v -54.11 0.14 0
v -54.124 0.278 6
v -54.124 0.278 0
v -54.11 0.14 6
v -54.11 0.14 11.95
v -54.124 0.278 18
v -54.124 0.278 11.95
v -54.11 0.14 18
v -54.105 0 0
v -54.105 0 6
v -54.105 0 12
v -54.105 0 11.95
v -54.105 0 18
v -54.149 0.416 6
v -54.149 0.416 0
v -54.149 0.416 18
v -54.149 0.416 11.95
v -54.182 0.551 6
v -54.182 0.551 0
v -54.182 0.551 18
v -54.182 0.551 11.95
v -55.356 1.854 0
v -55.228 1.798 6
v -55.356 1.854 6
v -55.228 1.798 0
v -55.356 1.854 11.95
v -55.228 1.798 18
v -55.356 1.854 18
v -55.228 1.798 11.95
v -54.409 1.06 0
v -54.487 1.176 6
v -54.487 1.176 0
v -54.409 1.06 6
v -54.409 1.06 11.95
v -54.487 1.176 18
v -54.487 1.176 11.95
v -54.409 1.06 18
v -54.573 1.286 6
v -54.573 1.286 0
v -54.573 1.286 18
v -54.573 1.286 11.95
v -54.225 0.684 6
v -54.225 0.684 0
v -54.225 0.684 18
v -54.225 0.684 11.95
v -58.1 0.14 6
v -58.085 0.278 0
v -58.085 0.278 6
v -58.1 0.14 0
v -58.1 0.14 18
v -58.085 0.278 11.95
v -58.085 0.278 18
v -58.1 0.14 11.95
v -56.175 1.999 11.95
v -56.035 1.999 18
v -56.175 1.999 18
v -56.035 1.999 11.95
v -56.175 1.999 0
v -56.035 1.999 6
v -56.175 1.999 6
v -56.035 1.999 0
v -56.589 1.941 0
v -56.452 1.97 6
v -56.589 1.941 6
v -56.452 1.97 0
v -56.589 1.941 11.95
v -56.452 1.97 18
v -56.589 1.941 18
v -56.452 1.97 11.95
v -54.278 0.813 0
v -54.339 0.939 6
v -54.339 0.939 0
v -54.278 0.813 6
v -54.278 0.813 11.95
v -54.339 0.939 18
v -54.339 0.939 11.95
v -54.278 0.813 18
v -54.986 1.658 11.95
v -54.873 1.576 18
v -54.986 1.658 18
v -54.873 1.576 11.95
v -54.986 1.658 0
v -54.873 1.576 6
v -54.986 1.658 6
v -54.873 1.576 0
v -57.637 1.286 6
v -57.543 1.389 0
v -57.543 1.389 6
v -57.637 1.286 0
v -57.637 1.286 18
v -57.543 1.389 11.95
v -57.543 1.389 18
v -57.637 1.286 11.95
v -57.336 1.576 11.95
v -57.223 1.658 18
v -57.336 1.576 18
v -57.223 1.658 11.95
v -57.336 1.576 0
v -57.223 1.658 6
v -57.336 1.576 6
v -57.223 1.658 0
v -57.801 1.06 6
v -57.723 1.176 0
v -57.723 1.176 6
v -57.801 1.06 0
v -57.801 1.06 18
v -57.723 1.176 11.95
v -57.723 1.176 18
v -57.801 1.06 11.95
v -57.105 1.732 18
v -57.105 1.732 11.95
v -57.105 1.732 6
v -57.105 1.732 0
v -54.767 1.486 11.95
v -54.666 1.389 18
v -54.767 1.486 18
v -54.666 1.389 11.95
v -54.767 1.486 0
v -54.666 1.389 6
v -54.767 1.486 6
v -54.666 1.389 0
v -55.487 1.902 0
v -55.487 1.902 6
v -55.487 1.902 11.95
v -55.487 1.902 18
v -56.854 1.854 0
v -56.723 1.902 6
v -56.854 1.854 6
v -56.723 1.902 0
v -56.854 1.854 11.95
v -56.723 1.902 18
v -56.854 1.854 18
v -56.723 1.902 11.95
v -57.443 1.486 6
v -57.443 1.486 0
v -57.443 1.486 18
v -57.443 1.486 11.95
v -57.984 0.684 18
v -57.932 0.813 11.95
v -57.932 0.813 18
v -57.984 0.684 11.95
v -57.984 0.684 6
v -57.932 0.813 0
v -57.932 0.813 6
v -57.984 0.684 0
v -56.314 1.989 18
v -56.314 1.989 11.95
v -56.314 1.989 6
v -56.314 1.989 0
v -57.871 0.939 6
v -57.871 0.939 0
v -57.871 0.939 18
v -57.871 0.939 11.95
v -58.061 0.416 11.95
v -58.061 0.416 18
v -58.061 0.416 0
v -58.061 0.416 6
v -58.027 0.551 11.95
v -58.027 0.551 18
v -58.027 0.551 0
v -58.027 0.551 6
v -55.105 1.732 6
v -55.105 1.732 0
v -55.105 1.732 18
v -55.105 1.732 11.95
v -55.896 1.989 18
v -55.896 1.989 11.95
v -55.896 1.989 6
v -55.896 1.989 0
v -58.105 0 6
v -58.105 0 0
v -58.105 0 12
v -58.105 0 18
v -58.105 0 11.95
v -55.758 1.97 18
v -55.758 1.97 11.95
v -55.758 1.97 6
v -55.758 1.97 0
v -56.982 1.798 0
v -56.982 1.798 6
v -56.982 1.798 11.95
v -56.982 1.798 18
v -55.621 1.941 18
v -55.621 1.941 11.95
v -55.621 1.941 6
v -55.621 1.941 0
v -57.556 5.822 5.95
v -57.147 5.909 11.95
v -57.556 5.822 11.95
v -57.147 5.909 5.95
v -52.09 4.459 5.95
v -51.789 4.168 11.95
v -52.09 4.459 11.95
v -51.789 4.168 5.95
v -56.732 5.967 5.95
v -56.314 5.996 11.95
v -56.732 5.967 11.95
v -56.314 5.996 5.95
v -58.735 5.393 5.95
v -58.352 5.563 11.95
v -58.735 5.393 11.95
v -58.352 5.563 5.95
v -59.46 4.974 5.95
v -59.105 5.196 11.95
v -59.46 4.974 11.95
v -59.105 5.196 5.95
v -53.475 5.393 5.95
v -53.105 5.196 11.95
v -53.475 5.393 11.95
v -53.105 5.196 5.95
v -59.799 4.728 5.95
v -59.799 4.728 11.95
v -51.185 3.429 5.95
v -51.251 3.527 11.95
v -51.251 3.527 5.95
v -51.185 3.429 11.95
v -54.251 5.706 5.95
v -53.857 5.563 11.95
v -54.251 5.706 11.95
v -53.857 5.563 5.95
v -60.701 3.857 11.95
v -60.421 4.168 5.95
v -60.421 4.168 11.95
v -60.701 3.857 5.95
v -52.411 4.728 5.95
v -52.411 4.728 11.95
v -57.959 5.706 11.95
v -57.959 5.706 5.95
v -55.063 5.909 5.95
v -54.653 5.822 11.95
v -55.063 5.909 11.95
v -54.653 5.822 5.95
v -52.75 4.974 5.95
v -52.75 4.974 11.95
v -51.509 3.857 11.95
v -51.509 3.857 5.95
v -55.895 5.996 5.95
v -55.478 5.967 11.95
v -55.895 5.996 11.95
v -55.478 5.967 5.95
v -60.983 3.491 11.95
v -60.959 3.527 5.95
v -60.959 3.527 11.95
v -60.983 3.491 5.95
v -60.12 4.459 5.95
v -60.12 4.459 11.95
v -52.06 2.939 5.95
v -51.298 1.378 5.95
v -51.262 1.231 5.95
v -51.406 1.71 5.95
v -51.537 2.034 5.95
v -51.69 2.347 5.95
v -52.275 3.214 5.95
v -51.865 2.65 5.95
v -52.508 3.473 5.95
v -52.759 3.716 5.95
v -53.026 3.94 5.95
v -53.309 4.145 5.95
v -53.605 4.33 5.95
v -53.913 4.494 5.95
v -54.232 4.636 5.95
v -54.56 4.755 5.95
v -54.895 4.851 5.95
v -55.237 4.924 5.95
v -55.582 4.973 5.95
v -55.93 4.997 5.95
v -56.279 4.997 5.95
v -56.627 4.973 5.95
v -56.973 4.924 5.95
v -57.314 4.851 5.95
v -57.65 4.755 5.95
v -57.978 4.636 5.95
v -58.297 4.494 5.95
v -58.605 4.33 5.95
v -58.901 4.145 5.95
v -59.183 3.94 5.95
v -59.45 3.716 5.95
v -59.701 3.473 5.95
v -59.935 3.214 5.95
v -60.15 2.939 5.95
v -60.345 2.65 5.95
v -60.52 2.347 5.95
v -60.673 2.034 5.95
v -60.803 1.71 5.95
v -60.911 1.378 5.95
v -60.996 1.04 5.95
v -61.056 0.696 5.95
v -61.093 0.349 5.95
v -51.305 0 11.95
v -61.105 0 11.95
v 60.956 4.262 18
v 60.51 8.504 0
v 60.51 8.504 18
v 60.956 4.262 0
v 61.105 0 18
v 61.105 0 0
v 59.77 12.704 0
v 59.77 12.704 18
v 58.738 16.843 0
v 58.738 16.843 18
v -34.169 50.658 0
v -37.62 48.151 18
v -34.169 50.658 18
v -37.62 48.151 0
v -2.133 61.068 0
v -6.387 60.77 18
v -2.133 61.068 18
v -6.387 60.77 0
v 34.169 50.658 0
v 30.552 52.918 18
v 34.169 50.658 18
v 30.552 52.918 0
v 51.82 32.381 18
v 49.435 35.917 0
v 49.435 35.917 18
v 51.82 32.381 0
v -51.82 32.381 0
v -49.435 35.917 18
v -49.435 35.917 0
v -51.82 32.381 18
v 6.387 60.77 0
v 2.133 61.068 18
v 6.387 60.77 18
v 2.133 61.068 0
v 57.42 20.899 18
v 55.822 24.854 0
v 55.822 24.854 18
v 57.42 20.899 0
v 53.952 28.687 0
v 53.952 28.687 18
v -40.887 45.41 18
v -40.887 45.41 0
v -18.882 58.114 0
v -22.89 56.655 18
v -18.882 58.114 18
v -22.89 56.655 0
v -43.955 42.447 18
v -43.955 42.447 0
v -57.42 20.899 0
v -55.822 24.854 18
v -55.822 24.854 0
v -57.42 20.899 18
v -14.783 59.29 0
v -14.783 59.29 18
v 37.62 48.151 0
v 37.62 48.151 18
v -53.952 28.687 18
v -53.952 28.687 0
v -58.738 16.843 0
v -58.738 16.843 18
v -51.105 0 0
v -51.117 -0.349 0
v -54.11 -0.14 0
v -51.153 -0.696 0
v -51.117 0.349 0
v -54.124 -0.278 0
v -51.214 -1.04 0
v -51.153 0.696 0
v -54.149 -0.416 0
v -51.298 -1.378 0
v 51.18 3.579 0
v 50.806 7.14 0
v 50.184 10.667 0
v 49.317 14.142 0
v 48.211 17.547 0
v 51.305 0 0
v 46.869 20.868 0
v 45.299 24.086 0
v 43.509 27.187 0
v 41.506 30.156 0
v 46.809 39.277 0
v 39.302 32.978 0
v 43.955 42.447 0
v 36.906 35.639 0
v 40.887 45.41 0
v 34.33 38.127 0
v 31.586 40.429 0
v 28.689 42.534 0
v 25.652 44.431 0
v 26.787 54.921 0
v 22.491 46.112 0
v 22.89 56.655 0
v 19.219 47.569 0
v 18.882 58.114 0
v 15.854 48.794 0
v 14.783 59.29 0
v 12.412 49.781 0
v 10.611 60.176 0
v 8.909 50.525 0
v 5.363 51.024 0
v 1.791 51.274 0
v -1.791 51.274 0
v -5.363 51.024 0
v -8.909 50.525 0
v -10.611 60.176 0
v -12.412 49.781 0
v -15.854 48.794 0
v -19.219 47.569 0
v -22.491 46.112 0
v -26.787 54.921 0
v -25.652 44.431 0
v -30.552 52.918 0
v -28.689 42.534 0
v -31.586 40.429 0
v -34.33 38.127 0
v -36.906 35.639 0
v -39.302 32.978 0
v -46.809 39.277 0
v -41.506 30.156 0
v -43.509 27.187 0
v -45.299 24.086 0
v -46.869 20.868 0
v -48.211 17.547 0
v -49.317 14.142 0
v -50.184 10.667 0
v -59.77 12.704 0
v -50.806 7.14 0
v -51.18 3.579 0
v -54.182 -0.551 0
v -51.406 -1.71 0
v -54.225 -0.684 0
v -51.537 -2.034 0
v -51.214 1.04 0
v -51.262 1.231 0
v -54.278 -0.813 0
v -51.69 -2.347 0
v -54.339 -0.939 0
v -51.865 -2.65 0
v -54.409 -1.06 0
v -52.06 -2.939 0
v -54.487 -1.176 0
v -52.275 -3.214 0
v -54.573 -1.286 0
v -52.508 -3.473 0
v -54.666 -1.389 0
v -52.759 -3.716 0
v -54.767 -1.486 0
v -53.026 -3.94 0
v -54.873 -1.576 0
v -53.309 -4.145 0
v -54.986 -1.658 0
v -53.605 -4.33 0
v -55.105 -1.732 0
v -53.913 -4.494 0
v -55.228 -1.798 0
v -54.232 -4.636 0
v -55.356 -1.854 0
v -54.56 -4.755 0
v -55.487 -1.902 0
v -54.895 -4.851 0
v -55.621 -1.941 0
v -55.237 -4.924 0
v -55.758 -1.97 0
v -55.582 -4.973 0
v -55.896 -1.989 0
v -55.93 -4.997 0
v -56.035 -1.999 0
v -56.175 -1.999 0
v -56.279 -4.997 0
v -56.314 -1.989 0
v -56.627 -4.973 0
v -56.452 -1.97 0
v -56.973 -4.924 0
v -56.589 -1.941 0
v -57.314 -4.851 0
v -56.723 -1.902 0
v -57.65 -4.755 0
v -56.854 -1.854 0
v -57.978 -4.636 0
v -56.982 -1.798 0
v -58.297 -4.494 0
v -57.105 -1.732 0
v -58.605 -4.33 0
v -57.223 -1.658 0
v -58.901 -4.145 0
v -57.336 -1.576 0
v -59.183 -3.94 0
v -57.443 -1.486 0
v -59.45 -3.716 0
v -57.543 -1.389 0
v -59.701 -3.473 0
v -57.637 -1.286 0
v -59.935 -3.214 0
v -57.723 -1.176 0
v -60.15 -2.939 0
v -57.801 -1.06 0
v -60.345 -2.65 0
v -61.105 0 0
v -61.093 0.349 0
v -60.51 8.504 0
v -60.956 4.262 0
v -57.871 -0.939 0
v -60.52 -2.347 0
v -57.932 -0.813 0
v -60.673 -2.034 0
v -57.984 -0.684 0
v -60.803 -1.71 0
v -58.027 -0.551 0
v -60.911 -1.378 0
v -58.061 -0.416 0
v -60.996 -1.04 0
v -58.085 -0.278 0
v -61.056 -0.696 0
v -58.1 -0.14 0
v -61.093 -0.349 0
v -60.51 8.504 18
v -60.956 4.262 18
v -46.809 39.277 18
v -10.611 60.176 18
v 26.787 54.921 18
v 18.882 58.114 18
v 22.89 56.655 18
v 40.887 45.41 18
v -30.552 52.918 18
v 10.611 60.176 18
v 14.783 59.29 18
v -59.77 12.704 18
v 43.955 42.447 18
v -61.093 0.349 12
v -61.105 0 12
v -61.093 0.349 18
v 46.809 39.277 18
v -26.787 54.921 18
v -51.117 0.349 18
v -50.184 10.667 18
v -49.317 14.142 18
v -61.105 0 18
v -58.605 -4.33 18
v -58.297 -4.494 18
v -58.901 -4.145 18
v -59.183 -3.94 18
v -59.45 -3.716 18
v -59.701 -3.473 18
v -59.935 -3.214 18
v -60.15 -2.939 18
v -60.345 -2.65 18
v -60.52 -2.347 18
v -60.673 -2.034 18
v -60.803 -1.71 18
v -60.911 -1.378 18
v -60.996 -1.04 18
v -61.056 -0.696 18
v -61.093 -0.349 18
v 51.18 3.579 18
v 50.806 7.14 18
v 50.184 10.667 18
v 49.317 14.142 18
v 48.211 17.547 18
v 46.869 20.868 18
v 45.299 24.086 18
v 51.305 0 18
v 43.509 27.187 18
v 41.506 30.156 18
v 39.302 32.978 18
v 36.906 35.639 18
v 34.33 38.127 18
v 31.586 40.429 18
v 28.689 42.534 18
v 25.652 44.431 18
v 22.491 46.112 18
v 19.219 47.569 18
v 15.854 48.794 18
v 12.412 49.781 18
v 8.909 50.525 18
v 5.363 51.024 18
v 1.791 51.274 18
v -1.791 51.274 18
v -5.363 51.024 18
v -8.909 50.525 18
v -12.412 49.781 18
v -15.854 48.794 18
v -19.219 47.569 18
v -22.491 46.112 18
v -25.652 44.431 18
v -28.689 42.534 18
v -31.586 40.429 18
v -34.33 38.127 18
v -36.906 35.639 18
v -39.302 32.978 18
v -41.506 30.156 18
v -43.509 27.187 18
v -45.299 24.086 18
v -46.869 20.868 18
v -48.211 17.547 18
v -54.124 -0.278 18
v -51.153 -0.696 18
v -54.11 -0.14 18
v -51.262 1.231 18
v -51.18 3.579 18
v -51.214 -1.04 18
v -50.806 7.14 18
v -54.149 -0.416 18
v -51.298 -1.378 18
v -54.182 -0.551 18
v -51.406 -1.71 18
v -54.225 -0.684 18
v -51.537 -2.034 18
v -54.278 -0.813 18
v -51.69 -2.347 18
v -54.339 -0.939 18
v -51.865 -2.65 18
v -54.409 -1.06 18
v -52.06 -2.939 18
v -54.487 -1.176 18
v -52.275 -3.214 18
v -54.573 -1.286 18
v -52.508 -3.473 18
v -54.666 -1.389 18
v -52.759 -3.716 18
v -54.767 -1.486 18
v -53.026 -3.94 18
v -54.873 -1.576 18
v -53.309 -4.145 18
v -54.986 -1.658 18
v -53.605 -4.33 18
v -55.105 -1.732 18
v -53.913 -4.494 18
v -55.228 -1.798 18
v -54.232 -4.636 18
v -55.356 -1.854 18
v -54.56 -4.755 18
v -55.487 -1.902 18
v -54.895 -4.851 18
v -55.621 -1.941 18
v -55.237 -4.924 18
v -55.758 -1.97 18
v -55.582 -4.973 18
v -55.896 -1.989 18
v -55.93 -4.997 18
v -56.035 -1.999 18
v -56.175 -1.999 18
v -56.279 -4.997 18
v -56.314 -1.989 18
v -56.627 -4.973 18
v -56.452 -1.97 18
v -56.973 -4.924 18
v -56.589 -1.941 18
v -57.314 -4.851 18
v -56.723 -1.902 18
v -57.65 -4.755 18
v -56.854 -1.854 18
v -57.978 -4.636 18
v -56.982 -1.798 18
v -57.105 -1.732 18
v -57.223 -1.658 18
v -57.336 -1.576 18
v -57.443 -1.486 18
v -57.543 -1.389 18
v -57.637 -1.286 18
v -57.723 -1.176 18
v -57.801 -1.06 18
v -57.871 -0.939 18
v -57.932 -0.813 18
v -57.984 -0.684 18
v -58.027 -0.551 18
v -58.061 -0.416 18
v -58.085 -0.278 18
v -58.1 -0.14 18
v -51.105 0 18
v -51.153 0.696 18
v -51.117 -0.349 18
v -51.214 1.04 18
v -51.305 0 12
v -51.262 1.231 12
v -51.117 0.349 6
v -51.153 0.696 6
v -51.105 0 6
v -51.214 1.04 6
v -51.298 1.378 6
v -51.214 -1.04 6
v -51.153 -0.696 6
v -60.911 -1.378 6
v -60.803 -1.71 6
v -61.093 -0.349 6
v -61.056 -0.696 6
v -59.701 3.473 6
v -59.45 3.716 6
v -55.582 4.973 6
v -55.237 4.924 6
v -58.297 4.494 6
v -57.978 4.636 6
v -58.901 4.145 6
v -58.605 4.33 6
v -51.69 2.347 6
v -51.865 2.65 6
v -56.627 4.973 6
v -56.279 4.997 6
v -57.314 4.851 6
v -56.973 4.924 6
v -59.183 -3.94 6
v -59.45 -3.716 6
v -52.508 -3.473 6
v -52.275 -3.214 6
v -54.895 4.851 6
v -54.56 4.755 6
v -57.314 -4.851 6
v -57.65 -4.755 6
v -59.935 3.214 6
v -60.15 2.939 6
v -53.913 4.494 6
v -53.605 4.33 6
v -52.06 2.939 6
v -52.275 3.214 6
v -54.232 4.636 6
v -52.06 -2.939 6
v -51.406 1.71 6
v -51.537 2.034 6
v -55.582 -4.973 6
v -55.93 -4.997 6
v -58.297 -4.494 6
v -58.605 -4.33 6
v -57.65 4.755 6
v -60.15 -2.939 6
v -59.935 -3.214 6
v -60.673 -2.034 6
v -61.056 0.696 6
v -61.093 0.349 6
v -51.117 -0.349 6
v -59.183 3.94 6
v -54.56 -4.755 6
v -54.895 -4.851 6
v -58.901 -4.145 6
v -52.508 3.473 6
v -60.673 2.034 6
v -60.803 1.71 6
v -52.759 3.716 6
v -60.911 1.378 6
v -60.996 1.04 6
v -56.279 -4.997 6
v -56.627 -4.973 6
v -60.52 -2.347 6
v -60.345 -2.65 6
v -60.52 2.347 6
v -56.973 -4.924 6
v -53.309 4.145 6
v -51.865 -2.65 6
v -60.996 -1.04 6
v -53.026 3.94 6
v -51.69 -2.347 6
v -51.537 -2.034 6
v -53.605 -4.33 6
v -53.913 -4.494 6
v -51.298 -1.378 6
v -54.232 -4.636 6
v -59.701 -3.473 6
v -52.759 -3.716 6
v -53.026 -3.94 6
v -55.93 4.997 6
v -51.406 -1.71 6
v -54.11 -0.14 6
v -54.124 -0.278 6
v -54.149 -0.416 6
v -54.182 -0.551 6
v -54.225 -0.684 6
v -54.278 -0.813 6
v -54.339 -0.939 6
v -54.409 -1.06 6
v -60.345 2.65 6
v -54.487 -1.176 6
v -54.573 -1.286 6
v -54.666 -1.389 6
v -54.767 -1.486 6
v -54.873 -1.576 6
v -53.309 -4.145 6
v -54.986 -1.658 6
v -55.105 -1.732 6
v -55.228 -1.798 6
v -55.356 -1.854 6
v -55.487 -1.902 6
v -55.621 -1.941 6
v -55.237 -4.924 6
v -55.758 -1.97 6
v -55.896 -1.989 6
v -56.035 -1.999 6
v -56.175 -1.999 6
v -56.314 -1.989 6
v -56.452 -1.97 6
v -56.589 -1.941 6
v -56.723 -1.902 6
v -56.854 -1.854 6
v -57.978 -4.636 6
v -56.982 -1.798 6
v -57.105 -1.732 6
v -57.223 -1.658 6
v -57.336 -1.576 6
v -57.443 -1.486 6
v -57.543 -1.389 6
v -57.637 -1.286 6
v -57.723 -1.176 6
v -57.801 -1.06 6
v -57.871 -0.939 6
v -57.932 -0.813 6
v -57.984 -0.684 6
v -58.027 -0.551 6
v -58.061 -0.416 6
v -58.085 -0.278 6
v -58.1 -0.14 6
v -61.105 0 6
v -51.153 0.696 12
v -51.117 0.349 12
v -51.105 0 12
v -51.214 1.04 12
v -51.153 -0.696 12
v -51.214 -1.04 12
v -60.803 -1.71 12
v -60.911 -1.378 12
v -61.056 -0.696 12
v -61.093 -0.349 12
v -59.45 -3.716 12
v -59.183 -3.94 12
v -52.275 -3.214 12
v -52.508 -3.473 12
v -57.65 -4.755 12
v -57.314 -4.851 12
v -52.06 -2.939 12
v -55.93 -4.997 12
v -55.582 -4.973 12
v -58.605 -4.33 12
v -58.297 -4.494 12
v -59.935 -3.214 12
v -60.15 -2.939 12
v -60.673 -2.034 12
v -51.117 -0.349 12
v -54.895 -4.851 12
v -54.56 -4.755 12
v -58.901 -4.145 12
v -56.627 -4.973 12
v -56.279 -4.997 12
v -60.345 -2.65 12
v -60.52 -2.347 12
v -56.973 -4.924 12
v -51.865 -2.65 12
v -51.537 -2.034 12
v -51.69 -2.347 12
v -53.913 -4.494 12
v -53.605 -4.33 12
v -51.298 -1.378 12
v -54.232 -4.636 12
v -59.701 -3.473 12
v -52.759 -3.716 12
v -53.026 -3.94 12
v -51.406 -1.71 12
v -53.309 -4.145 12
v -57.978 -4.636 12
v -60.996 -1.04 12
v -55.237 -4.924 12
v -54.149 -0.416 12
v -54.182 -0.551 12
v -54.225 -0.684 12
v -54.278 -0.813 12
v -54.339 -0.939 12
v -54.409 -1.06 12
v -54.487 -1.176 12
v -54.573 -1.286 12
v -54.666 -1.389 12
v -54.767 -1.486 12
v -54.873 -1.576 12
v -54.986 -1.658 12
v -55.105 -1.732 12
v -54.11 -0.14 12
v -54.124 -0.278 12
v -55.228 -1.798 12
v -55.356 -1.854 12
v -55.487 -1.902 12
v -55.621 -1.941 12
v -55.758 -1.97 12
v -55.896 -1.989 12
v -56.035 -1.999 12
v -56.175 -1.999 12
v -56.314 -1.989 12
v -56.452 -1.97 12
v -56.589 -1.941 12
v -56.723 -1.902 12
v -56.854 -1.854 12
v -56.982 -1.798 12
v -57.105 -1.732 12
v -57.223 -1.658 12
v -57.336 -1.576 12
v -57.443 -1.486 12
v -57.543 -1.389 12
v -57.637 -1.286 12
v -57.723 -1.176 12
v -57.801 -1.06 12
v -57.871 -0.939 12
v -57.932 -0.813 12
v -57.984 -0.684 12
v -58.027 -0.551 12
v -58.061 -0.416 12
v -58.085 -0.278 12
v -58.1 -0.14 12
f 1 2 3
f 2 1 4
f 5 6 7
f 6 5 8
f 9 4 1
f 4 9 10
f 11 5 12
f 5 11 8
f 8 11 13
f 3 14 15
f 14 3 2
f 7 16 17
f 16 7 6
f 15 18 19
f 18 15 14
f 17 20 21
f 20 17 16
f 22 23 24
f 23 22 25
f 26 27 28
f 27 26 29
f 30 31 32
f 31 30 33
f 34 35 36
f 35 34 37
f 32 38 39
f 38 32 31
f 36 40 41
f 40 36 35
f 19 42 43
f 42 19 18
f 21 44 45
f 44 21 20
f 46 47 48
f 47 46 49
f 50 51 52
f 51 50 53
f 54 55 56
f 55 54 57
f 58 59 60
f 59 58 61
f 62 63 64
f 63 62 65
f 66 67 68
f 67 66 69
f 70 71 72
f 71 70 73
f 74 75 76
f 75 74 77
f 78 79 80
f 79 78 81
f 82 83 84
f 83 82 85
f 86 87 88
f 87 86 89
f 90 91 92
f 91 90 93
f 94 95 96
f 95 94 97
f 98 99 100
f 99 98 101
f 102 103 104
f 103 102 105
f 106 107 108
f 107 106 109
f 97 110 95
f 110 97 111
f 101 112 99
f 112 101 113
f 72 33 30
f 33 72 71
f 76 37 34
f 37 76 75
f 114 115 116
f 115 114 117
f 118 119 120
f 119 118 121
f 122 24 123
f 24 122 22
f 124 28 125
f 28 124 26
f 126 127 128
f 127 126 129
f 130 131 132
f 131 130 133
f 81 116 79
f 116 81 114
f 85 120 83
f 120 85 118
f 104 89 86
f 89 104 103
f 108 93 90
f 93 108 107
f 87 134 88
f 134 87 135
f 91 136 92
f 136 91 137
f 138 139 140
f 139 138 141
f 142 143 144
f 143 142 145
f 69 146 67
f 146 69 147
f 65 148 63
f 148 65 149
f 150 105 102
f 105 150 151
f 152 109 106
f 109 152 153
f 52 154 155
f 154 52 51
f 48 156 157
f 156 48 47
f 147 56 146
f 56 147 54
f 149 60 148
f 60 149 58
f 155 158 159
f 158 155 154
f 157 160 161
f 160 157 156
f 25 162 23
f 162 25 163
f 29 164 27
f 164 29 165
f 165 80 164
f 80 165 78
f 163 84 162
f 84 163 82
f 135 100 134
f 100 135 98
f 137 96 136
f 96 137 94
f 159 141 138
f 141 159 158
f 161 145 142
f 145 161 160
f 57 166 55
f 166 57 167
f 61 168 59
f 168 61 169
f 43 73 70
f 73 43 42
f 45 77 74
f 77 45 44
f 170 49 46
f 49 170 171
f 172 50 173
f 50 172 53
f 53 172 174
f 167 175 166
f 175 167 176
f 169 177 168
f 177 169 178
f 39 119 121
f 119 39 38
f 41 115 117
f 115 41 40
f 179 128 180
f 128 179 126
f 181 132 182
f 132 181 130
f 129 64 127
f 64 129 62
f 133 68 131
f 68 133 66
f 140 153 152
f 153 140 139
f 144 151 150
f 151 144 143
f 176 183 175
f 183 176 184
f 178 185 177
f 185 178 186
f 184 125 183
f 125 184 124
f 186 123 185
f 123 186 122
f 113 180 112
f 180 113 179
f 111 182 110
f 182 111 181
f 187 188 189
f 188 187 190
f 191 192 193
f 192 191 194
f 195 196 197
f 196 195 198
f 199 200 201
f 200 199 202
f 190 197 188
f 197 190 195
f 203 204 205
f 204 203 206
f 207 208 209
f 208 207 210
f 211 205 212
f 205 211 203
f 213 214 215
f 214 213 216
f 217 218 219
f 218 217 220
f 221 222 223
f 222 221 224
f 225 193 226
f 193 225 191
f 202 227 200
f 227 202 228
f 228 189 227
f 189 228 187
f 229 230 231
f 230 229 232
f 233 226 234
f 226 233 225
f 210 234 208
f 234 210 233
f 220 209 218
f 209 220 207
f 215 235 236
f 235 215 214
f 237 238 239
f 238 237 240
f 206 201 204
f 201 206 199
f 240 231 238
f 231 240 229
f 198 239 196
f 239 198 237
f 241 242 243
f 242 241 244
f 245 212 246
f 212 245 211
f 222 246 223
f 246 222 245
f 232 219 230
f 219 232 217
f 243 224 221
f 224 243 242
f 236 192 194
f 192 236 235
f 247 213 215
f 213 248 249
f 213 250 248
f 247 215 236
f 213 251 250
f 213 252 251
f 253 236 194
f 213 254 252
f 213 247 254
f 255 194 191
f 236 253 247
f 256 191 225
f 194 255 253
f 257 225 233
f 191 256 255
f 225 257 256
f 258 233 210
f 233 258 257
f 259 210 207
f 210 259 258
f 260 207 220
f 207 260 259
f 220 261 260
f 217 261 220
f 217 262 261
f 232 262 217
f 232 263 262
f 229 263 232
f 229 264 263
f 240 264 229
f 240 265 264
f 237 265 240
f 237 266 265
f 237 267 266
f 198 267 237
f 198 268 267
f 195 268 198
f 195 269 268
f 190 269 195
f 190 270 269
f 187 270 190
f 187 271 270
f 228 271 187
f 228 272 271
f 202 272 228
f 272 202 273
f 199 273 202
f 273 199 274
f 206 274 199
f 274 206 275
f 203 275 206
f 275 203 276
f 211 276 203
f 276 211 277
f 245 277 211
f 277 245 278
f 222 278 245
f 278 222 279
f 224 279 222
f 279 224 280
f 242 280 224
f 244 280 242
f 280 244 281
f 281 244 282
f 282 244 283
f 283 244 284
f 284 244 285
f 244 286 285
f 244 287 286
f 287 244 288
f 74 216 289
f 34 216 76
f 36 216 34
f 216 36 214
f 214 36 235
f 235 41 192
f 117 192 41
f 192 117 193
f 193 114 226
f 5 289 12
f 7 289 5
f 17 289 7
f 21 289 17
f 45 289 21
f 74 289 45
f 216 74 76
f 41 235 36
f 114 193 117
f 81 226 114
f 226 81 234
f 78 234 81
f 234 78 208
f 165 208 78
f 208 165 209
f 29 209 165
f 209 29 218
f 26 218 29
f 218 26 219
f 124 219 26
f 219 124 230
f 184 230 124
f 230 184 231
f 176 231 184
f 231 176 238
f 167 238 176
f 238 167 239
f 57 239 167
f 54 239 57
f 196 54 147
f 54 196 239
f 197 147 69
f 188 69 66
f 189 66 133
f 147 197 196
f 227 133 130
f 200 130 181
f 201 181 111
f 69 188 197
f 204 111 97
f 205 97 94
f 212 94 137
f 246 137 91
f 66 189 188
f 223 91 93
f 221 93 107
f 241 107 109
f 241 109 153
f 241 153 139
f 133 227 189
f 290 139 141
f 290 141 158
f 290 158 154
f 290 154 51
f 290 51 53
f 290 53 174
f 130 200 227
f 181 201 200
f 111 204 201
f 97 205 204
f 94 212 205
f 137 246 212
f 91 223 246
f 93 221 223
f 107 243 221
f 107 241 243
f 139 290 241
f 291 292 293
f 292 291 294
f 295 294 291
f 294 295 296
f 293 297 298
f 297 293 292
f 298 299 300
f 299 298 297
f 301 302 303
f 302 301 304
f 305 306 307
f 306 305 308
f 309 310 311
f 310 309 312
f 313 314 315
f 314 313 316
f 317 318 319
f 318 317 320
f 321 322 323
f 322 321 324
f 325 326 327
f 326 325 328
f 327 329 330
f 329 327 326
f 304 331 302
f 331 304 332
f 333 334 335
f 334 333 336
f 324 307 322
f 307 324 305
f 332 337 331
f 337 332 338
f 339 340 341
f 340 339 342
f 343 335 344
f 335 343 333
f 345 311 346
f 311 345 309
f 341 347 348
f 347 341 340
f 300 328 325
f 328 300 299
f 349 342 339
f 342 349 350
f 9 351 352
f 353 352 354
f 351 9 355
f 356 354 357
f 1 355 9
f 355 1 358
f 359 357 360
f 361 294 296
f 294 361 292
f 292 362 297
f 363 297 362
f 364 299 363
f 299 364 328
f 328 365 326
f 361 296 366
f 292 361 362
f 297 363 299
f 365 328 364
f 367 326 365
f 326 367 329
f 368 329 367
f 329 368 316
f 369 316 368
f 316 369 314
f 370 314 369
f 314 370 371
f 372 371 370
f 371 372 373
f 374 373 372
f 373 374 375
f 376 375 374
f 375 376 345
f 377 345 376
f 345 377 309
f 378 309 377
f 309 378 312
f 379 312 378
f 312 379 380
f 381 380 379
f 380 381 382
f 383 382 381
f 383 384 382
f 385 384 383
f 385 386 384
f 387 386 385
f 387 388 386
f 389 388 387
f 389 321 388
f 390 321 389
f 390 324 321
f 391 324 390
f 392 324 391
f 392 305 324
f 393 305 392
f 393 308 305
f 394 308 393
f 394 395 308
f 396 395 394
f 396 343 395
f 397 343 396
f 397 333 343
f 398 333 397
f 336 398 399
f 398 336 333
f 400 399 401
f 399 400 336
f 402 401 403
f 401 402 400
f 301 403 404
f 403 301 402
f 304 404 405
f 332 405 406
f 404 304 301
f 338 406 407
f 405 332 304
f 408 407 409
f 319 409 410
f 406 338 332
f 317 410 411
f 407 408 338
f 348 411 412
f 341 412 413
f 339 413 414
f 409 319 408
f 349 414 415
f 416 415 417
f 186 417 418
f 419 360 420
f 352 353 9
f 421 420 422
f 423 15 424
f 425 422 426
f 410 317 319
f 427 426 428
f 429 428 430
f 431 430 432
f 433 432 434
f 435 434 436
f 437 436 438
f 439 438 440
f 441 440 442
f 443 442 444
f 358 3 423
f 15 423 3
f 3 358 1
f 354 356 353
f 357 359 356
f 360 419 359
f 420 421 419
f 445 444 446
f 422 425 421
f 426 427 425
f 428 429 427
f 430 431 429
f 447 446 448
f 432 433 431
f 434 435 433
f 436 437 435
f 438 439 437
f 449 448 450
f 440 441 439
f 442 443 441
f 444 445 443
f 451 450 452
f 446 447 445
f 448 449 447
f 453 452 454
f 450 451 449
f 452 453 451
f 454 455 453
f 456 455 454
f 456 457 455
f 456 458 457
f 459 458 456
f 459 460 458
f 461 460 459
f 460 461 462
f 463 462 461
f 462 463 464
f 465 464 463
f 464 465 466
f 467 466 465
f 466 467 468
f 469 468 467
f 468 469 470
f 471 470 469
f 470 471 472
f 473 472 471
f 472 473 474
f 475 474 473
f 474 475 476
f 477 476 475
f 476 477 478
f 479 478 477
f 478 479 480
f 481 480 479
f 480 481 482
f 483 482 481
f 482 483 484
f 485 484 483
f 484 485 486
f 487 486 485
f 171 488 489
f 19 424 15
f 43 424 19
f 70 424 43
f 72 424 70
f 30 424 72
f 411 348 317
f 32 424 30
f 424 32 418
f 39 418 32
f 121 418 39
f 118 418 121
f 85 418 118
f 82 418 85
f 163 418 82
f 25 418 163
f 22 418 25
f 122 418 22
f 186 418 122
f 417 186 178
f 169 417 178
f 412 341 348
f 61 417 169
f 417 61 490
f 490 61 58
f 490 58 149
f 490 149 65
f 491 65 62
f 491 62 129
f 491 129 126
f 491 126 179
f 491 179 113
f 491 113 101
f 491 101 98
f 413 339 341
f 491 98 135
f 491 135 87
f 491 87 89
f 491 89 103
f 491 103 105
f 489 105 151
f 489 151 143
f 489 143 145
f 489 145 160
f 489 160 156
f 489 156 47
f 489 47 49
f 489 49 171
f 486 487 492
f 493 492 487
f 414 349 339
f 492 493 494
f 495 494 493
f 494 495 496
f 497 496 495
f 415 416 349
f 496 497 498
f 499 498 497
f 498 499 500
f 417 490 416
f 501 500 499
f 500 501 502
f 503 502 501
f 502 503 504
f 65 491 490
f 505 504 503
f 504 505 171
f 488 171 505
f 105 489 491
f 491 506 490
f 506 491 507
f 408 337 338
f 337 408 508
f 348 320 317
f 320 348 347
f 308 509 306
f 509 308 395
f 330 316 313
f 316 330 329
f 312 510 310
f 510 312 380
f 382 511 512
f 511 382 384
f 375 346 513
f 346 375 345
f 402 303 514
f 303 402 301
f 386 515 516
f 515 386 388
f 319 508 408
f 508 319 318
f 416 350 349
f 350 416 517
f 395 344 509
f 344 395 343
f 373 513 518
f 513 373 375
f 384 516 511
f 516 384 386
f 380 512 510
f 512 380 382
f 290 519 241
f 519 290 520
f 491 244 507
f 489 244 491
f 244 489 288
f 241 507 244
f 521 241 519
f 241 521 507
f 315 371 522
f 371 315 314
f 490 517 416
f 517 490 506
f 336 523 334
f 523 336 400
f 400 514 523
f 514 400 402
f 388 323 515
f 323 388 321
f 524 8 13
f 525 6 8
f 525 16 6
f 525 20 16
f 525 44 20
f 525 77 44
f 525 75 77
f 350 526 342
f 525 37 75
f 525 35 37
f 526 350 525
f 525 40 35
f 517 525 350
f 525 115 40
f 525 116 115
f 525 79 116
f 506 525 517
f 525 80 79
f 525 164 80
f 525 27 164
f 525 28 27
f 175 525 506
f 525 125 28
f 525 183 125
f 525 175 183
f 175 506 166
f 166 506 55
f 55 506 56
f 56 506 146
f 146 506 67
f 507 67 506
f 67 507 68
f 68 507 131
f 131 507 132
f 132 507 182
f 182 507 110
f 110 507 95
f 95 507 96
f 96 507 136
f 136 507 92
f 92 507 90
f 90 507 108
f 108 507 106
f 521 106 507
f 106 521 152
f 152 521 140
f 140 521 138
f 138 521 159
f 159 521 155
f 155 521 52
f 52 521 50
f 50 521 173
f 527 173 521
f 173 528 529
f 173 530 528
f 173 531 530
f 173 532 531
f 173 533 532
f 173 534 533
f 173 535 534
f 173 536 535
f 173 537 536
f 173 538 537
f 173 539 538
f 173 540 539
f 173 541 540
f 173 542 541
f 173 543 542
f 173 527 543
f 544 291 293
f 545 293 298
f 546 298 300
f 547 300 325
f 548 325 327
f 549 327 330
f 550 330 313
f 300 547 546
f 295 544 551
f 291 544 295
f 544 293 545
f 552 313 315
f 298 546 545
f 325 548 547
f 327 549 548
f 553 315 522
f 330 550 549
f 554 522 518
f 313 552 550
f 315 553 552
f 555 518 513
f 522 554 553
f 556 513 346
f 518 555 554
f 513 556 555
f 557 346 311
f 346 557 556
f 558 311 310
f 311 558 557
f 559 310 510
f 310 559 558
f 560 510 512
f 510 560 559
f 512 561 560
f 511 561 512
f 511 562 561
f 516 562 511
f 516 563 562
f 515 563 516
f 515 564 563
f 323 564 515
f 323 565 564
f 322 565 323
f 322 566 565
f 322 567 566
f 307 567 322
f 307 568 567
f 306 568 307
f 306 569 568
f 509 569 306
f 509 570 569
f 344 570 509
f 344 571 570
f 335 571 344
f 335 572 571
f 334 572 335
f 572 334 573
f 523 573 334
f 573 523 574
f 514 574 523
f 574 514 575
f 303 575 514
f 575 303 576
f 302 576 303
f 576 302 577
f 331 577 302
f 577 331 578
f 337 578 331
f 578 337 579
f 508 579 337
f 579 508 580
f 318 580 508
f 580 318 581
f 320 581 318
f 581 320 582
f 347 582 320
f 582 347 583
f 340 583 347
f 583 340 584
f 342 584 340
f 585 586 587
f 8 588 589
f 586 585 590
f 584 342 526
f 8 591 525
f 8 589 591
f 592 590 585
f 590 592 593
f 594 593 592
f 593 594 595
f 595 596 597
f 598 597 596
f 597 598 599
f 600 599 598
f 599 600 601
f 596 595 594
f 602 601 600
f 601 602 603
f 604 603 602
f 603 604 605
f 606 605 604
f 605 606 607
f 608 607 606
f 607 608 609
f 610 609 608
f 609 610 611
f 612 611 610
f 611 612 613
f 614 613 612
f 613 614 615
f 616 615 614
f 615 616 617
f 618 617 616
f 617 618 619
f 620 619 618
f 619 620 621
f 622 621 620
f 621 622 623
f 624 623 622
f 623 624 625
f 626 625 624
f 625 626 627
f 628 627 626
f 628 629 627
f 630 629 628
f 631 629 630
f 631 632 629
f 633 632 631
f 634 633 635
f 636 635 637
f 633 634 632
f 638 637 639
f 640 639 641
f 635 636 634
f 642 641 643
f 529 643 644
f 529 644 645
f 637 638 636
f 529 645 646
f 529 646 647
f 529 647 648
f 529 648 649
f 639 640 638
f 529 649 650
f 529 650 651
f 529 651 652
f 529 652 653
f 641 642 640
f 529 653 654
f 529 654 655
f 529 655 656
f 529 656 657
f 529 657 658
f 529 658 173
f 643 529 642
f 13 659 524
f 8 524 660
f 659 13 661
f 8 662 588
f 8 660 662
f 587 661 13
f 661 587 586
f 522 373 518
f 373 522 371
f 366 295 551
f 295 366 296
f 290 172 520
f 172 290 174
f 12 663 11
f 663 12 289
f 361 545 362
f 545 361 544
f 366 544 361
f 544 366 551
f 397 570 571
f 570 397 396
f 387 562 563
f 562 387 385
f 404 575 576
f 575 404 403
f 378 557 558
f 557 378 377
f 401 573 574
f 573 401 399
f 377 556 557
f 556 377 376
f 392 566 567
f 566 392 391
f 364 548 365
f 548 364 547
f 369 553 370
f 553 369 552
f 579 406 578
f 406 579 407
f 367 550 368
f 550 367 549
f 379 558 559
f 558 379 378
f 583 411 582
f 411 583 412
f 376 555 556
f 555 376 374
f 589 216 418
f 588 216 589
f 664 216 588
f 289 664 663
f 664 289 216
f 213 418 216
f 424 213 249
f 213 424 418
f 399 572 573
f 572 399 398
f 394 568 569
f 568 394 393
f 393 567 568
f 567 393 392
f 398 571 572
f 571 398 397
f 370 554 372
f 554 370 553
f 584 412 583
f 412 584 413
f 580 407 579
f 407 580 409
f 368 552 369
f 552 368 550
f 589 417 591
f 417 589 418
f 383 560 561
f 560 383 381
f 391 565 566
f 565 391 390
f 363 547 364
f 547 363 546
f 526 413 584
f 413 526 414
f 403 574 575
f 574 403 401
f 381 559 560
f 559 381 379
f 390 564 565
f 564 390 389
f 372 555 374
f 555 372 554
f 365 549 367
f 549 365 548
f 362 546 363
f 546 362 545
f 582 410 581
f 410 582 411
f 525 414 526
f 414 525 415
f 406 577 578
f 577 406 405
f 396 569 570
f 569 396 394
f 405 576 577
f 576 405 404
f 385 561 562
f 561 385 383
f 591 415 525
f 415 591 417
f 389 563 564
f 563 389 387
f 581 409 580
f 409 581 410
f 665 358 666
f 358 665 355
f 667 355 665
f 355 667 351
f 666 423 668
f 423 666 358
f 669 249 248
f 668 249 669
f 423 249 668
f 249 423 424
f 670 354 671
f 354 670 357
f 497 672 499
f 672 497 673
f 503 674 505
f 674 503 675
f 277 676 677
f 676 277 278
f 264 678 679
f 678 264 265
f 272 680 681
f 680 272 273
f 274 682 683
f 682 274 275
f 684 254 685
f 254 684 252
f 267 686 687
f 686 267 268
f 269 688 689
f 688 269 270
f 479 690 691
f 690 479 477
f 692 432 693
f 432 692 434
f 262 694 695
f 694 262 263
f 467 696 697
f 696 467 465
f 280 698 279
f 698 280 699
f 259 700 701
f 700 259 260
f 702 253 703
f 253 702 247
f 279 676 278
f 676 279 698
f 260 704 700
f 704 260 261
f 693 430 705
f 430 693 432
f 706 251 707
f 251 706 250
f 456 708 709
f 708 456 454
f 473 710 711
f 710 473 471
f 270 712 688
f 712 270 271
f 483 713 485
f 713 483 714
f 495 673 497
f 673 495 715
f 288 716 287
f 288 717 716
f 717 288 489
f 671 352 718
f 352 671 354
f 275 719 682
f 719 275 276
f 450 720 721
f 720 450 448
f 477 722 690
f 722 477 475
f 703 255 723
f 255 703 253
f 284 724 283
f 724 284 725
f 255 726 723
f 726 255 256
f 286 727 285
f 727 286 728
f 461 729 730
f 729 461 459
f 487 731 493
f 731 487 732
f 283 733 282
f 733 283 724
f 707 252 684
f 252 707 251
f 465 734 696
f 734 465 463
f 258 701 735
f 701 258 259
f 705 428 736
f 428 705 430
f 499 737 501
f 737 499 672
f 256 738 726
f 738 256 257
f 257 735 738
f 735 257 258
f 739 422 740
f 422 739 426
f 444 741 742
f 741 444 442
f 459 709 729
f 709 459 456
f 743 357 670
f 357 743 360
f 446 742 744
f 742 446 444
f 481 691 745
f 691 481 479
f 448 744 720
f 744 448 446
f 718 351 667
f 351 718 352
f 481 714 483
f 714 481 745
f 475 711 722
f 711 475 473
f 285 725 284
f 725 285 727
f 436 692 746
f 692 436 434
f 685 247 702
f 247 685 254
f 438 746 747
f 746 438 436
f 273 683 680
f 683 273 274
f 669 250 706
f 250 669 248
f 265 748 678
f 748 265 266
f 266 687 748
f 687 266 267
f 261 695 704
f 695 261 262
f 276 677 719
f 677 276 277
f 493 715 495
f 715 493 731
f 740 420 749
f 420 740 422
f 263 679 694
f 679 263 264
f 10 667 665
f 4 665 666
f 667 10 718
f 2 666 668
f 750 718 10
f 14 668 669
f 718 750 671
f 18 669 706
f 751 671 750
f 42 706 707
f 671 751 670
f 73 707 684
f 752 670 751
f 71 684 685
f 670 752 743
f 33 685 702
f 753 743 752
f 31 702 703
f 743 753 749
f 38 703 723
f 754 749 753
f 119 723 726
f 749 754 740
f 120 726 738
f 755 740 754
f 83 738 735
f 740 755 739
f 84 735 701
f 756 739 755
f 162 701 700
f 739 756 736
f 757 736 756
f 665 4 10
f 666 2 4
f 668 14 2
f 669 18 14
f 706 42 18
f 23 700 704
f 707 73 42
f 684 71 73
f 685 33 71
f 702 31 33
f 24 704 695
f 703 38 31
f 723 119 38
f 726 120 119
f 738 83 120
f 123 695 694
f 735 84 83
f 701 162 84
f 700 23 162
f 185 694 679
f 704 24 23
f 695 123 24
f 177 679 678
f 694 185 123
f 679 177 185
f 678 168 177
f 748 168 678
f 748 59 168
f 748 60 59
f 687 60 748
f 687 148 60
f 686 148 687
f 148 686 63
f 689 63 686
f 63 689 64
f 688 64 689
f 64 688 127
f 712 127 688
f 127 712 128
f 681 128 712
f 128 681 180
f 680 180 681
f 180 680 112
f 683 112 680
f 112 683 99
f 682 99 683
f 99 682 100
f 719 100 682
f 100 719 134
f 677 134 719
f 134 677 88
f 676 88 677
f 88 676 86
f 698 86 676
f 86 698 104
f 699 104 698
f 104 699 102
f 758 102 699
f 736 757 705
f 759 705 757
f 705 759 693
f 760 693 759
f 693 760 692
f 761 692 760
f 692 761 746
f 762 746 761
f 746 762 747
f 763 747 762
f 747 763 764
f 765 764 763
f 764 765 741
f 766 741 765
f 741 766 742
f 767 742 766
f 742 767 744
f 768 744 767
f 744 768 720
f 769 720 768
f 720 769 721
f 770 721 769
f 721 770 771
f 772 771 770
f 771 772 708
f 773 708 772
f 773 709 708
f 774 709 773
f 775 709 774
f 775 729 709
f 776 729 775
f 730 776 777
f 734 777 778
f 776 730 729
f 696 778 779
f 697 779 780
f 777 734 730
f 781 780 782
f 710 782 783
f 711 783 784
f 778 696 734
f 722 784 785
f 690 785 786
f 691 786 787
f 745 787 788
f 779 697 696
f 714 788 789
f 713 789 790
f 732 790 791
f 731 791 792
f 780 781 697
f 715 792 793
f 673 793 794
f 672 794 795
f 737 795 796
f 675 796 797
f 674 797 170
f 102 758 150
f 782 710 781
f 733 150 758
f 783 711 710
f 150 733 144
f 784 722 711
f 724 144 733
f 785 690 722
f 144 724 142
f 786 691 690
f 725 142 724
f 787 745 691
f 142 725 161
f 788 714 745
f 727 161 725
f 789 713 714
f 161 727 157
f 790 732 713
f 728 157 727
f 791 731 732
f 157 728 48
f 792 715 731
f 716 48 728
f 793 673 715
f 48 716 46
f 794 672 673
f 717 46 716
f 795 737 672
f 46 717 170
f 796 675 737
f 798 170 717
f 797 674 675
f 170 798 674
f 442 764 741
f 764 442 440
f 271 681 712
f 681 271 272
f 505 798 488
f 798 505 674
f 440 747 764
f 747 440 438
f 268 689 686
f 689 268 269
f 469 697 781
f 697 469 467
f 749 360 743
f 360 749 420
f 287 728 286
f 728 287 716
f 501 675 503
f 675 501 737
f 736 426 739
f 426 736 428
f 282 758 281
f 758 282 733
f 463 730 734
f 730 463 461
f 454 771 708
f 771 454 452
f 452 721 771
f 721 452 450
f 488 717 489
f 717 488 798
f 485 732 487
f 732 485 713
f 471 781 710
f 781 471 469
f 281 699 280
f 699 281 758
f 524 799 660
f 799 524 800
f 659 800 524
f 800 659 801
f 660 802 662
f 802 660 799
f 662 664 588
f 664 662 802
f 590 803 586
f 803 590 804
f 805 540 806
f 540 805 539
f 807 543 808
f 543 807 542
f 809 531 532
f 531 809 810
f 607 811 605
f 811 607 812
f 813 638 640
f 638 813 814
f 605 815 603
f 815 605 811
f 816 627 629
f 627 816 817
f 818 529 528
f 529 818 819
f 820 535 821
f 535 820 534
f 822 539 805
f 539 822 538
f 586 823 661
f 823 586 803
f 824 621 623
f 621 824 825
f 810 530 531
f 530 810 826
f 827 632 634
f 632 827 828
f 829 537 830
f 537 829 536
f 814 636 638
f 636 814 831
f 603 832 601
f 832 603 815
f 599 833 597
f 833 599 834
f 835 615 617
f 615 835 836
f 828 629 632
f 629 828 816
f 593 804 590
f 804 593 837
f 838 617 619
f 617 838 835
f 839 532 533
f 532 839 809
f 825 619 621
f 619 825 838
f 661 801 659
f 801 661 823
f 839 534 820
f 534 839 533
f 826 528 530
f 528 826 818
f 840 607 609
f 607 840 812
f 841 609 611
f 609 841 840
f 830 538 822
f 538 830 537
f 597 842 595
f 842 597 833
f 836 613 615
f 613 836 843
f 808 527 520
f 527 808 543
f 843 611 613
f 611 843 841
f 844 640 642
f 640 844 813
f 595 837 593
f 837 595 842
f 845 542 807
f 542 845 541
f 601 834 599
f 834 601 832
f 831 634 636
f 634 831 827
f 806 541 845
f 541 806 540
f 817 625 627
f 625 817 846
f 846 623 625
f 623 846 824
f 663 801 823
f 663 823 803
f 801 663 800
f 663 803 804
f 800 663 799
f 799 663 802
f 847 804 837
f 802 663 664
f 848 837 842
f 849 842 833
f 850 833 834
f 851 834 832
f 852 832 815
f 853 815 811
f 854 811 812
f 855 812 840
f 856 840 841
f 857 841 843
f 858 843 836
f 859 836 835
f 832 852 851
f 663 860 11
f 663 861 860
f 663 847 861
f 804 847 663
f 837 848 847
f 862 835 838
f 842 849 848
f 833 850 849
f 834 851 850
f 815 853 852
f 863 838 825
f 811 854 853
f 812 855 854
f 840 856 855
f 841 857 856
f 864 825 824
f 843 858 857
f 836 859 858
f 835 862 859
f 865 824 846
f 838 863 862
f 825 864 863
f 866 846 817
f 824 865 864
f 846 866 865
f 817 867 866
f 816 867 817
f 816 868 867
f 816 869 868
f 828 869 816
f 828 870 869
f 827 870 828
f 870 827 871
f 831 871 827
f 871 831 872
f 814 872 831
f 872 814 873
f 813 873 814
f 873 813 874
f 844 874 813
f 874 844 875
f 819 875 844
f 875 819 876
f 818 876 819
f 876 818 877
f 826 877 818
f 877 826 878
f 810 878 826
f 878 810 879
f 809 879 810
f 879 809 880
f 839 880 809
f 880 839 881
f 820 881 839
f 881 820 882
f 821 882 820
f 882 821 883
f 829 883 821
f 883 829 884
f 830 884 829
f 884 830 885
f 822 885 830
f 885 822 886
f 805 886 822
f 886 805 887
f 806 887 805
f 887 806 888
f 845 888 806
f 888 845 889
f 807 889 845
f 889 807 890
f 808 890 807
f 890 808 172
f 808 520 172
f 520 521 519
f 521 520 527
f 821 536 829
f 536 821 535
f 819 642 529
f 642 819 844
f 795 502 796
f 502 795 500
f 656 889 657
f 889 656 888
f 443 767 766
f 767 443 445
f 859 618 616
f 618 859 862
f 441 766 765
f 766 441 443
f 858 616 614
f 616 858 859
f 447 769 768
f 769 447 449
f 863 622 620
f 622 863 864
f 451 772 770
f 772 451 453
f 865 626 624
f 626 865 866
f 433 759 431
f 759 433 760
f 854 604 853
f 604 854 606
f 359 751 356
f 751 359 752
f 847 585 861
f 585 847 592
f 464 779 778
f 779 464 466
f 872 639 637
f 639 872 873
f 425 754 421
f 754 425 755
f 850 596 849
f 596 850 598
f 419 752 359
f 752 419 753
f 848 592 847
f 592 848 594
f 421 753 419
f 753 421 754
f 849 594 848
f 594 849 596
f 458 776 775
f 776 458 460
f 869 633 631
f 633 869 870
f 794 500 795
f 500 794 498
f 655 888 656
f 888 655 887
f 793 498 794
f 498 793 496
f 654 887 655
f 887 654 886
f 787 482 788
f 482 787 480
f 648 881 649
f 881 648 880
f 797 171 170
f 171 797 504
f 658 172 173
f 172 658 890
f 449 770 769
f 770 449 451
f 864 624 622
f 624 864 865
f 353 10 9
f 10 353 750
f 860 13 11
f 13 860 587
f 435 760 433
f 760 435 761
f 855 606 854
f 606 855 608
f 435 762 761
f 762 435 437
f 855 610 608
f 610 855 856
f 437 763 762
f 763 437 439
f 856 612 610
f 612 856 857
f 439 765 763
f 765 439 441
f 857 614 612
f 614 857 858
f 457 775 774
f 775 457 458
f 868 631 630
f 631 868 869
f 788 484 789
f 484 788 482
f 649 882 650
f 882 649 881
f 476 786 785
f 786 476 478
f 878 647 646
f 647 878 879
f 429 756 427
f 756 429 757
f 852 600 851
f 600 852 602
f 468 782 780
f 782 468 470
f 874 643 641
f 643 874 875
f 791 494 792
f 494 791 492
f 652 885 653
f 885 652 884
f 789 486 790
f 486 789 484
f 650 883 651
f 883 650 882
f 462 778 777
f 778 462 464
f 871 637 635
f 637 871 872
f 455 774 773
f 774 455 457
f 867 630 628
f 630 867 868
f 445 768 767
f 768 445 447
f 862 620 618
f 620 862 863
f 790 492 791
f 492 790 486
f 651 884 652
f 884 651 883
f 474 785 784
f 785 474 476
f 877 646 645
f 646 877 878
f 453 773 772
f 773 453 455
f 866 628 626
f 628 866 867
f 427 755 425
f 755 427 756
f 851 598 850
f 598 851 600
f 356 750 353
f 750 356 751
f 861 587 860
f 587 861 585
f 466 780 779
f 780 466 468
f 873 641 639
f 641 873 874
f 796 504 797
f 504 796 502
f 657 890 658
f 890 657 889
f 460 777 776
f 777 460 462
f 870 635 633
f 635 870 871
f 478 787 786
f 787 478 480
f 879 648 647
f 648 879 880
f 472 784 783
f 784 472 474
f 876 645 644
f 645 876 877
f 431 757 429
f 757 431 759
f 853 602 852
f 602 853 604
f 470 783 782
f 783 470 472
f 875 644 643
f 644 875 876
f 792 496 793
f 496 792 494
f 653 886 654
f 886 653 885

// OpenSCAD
// ***********************************
// Project: 3D Printed Rocket
// Filename: Rocket98.scad
// by David M. Flynn
// Created: 10/4/2022 
// Revision: 1.0.2  12/15/2022
// Units: mm
// ***********************************
//  ***** Notes *****
//
//  Rocket with 98mm Body and 54mm motor. 
//
//  ***** History *****
// 1.0.2  12/15/2022 Updated electronics bay
// 1.0.1  10/11/2022 Added Rail Guides
// 1.0.0  10/4/2022  First code.
//
// ***********************************
//  ***** for STL output *****
//
// *** Nosecode ***
/*
FairingConeOGive(Fairing_OD=R98_Body_OD, 
					FairingWall_T=FairingWall_T,
					NC_Base=NC_Base, 
					NC_Len=NC_Len, 
					NC_Wall_t=NC_Wall_t,
					NC_Tip_r=NC_Tip_r,
					Cut_Z=180, LowerPortion=false);
/**/
// rotate([180,0,0]) NoseLockRing(Fairing_OD=Fairing_OD, Fairing_ID =Fairing_ID);

// BluntOgiveWeight(OD=R98_Body_OD, L=NC_Len, Tip_R=NC_Tip_r, Wall_T=NC_Wall_t);

// *** Fairing ***
/*
F54_FairingHalf(IsLeftHalf=true, 
				Fairing_OD=Fairing_OD,
				Wall_T=FairingWall_T,
				Len=Fairing_Len);
/**/
/*
F54_FairingHalf(IsLeftHalf=false, 
				Fairing_OD=Fairing_OD,
				Wall_T=FairingWall_T,
				Len=Fairing_Len);
/**/
//F54_SpringEndCap();
//
// *** Electronics Bay ***
// R98_Electronics_Bay2(Tube_OD=R98_Body_OD, Tube_ID=R98_Body_ID, Fairing_ID=Fairing_ID, InnerTube_OD=R98_BayInnerTube_OD);
// FairingBaseBulkPlate(Tube_ID=R98_Body_ID, Fairing_ID=Fairing_ID, ShockCord_a=-100);
// AltDoor54(Tube_OD=R98_Body_OD);
// DoubleBatteryHolder(Tube_ID=PML98Body_ID, HasBoltHoles=true); // oops!
//
// *** Cable Puller ***
// ThroughOut();
// rotate([0,90,0]) SpringBody();
// CableRetainer();
// StopAdjuster();
// CageBottom();
// AddServo(); // CageTop w/ servo mount
//
//
// *** Fin Can ***
// UpperFinCan();
// Rocket98Fin();
// rotate([180,0,0]) LowerFinCan();
// rotate([90,0,0]) BoltOnRailGuide(Length = 40, BoltSpace=12.7, RoundEnds=true);
// rotate([0,-90,0]) TubeBoltedRailGuide(TubeOD=R98_Body_OD, Length = 25, Offset = 5.5);
//
// ***********************************
//  ***** Routines *****
//
//
// ***********************************
//  ***** for Viewing *****
//
// ShowRocket98();
//
// ***********************************
include<Fairing54.scad>
include<FinCan.scad>
include<AltBay.scad>
include<BatteryHolderLib.scad>

//also included
 //include<NoseCone.scad>
 //include<ChargeHolder.scad>
 //include<CablePuller.scad>
 //include<FairingJointLib.scad>
 //include<RailGuide.scad>
 //include<Fins.scad>
 //include<TubesLib.scad>
 //include<BearingLib.scad>
 //include<CommonStuffSAEmm.scad>

Overlap=0.05;
IDXtra=0.2;
$fn=$preview? 24:90;

nFins=5;
R98_Fin_Post_h=10;
R98_Fin_Root_L=200;
R98_Fin_Root_W=14;
R98_Fin_Tip_W=5;
R98_Fin_Tip_L=80;
R98_Fin_Span=180;
R98_Fin_TipOffset=120;
R98_Fin_Chamfer_L=32;

R98_Body_OD=PML98Body_OD;
R98_Body_ID=PML98Body_ID;
R98_MtrTube_OD=PML54Body_OD;
R98_MtrTube_ID=PML54Body_ID;
R98_BayInnerTube_OD=BT38Body_OD;
R98_BayInnerTube_ID=BT38Body_ID;

EBay_Len=162;

// Fairing Overrides
Fairing_OD=PML98Body_OD;
FairingWall_T=2.2;
Fairing_ID=Fairing_OD-FairingWall_T*2;

NoseconeSep_Z=0; // This much of the nosecone becomes part of the fairing.
NC_Len=350;
NC_Tip_r=5;
NC_Base=5;
NC_Lock_H=5;

Fairing_Len=180; // Body of the fairing.

BodyTubeLen=36*25.4;

Alt_DoorXtra_X=2;
Alt_DoorXtra_Y=2;


module ShowRocket98(){
	
	translate([0,0,R98_Fin_Root_L+100+EBay_Len+BodyTubeLen+Fairing_Len+Overlap*2]){
		FairingConeOGive(Fairing_OD=R98_Body_OD, 
						FairingWall_T=FairingWall_T,
						NC_Base=NC_Base, 
						NC_Len=NC_Len, 
						NC_Wall_t=NC_Wall_t,
						NC_Tip_r=NC_Tip_r);
		
		translate([0,0,-NC_Lock_H]) NoseLockRing(Fairing_ID =Fairing_ID);
	}
	
	translate([0,0,R98_Fin_Root_L+100+BodyTubeLen+EBay_Len+Overlap])
		F54_FairingHalf(IsLeftHalf=true, 
				Fairing_OD=Fairing_OD,
				Wall_T=FairingWall_T,
				Len=Fairing_Len);
	
	translate([0,0,R98_Fin_Root_L+100+BodyTubeLen]) rotate([0,0,30]) R98_Electronics_Bay2();
	
	translate([0,0,R98_Fin_Root_L+100+Overlap]) color("LightBlue") Tube(OD=R98_Body_OD, ID=R98_Body_ID, 
			Len=BodyTubeLen-Overlap*2, myfn=$preview? 90:360);
	
	translate([0,0,R98_Fin_Root_L+100+Overlap]) color("White") UpperFinCan();
	color("LightGreen") LowerFinCan();
	
	//*
	for (j=[0:nFins]) rotate([0,0,360/nFins*j])
		translate([R98_Body_OD/2-R98_Fin_Post_h, 0, R98_Fin_Root_L/2+50]) 
			rotate([0,90,0]) color("Yellow") Rocket98Fin();
	/**/
} // ShowRocket98

//ShowRocket98();


module R98_Electronics_Bay2(Tube_OD=R98_Body_OD, Tube_ID=R98_Body_ID, 
					Fairing_ID=Fairing_ID, InnerTube_OD=BT54Mtr_OD){
	Len=162;
	CablePuller_Z=81;
	BattSwDoor_Z=70;
	TopSkirt_Len=15;
	BottomSkirt_Len=15;
	CP1_a=0;
	Alt_a=180;
	Batt1_a=90; // Altimeter Battery
	Batt2_a=270; // Cable puller battery and switch
	
	// The Fairing clamps onto this. 
	translate([0,0,Len]) FairingBaseLockRing(Tube_OD=Tube_OD, Tube_ID=Tube_ID, Fairing_ID=Fairing_ID, Interface=Overlap, BlendToTube=true);
	
	difference(){
		union(){
			Tube(OD=Tube_OD, ID=Tube_ID, Len=Len, myfn=$preview? 36:360);
			translate([0,0,BottomSkirt_Len])
				CenteringRing(OD=Tube_OD-1, ID=InnerTube_OD+IDXtra*2, Thickness=5, nHoles=4);
			translate([0,0,Len-5-TopSkirt_Len])
				CenteringRing(OD=Tube_OD-1, ID=InnerTube_OD+IDXtra*2, Thickness=5, nHoles=4);
	} // union
		
		// Altimeter
		translate([0,0,CablePuller_Z]) rotate([0,0,Alt_a]) 
			Alt_BayFrameHole(Tube_OD=Tube_OD, DoorXtra_X=Alt_DoorXtra_X, DoorXtra_Y=Alt_DoorXtra_Y);
	
		// Cable Puller door hole
		translate([0,0,CablePuller_Z]) rotate([0,0,CP1_a])
			CP_BayFrameHole(Tube_OD=Tube_OD);
		
		// Battery and Switch door holes
		translate([0,0,BattSwDoor_Z]) rotate([0,0,Batt1_a]) 
			Batt_BayFrameHole(Tube_OD=Tube_OD, HasSwitch=false);
		translate([0,0,BattSwDoor_Z]) rotate([0,0,Batt2_a]) 
			Batt_BayFrameHole(Tube_OD=Tube_OD, HasSwitch=true);
		
	} // difference
	
	// Altimeter
	translate([0,0,CablePuller_Z]) rotate([0,0,Alt_a])
		Alt_BayDoorFrame(Tube_OD=Tube_OD, Tube_ID=Tube_ID, DoorXtra_X=Alt_DoorXtra_X, DoorXtra_Y=Alt_DoorXtra_Y, ShowDoor=false);
	
	// Cable Pullers
	translate([0,0,CablePuller_Z]) rotate([0,0,CP1_a])
		CP_BayDoorFrame(Tube_OD=Tube_OD, Tube_ID=Tube_ID, ShowDoor=false);
	
	// Battery and Switch door2
	translate([0,0,BattSwDoor_Z]) rotate([0,0,Batt1_a]) 
		Batt_BayDoorFrame(Tube_OD=Tube_OD, Tube_ID=Tube_ID, HasSwitch=false, ShowDoor=false);
	translate([0,0,BattSwDoor_Z]) rotate([0,0,Batt2_a]) 
		Batt_BayDoorFrame(Tube_OD=Tube_OD, Tube_ID=Tube_ID, HasSwitch=true, ShowDoor=false);
	
} // R98_Electronics_Bay2

//translate([0,0,162]) R98_Electronics_Bay2();


module UpperFinCan(){
	// Upper Half of Fin Can
	
	rotate([180,0,0]) 
		FinCan3(Tube_OD=R98_Body_OD, Tube_ID=R98_Body_ID, MtrTube_OD=R98_MtrTube_OD+IDXtra*2, nFins=nFins,
			Post_h=R98_Fin_Post_h, Root_L=R98_Fin_Root_L, Root_W=R98_Fin_Root_W, 
			Chamfer_L=R98_Fin_Chamfer_L, HasTailCone=false); 

} // UpperFinCan

//UpperFinCan();

module LowerFinCan(){
	
	difference(){
		FinCan3(Tube_OD=R98_Body_OD, Tube_ID=R98_Body_ID, MtrTube_OD=R98_MtrTube_OD+IDXtra*2, nFins=nFins, 
			Post_h=R98_Fin_Post_h, Root_L=R98_Fin_Root_L, Root_W=R98_Fin_Root_W, 
			Chamfer_L=R98_Fin_Chamfer_L, 
			HasTailCone=true,
					MtrRetainer_OD=R98_MtrTube_OD+5,
					MtrRetainer_L=20,
					MtrRetainer_Inset=7); // Lower Half of Fin Can
		
		translate([0,0,80]) rotate([0,0,-90-180/nFins]) 
			translate([0,R98_Body_OD/2+2,0]) RailGuideBoltPattern(BoltSpace=12.7) Bolt6Hole();
	} // difference
		


	difference(){
		translate([0,0,80]) rotate([0,0,-90-180/nFins]) 
			//RailButtonPost(OD=R98_Body_OD, MtrTube_OD=R98_MtrTube_OD, H=R98_Body_OD/2+5, Len=30);
			RailGuidePost(OD=R98_Body_OD, MtrTube_OD=R98_MtrTube_OD+IDXtra*2, H=R98_Body_OD/2+2, TubeLen=70, Length = 40, BoltSpace=12.7);
		translate([0,0,50]) TrapFin2Slots(Tube_OD=R98_Body_OD, nFins=nFins, 	
			Post_h=R98_Fin_Post_h, Root_L=R98_Fin_Root_L, Root_W=R98_Fin_Root_W, Chamfer_L=R98_Fin_Chamfer_L);
	} // difference

} // LowerFinCan

// LowerFinCan();

module Rocket98Fin(){
	TrapFin2(Post_h=R98_Fin_Post_h, Root_L=R98_Fin_Root_L, Tip_L=R98_Fin_Tip_L, 
			Root_W=R98_Fin_Root_W, Tip_W=R98_Fin_Tip_W, 
			Span=R98_Fin_Span, Chamfer_L=R98_Fin_Chamfer_L,
					TipOffset=R98_Fin_TipOffset);

	if ($preview==false){
		translate([-R98_Fin_Root_L/2+10,0,0]) cylinder(d=R98_Fin_Root_W*2.5, h=0.9); // Neg
		translate([R98_Fin_Root_L/2-10,0,0]) cylinder(d=R98_Fin_Root_W*2.5, h=0.9); // Pos
	}
} // Rocket98Fin

// Rocket98Fin();
